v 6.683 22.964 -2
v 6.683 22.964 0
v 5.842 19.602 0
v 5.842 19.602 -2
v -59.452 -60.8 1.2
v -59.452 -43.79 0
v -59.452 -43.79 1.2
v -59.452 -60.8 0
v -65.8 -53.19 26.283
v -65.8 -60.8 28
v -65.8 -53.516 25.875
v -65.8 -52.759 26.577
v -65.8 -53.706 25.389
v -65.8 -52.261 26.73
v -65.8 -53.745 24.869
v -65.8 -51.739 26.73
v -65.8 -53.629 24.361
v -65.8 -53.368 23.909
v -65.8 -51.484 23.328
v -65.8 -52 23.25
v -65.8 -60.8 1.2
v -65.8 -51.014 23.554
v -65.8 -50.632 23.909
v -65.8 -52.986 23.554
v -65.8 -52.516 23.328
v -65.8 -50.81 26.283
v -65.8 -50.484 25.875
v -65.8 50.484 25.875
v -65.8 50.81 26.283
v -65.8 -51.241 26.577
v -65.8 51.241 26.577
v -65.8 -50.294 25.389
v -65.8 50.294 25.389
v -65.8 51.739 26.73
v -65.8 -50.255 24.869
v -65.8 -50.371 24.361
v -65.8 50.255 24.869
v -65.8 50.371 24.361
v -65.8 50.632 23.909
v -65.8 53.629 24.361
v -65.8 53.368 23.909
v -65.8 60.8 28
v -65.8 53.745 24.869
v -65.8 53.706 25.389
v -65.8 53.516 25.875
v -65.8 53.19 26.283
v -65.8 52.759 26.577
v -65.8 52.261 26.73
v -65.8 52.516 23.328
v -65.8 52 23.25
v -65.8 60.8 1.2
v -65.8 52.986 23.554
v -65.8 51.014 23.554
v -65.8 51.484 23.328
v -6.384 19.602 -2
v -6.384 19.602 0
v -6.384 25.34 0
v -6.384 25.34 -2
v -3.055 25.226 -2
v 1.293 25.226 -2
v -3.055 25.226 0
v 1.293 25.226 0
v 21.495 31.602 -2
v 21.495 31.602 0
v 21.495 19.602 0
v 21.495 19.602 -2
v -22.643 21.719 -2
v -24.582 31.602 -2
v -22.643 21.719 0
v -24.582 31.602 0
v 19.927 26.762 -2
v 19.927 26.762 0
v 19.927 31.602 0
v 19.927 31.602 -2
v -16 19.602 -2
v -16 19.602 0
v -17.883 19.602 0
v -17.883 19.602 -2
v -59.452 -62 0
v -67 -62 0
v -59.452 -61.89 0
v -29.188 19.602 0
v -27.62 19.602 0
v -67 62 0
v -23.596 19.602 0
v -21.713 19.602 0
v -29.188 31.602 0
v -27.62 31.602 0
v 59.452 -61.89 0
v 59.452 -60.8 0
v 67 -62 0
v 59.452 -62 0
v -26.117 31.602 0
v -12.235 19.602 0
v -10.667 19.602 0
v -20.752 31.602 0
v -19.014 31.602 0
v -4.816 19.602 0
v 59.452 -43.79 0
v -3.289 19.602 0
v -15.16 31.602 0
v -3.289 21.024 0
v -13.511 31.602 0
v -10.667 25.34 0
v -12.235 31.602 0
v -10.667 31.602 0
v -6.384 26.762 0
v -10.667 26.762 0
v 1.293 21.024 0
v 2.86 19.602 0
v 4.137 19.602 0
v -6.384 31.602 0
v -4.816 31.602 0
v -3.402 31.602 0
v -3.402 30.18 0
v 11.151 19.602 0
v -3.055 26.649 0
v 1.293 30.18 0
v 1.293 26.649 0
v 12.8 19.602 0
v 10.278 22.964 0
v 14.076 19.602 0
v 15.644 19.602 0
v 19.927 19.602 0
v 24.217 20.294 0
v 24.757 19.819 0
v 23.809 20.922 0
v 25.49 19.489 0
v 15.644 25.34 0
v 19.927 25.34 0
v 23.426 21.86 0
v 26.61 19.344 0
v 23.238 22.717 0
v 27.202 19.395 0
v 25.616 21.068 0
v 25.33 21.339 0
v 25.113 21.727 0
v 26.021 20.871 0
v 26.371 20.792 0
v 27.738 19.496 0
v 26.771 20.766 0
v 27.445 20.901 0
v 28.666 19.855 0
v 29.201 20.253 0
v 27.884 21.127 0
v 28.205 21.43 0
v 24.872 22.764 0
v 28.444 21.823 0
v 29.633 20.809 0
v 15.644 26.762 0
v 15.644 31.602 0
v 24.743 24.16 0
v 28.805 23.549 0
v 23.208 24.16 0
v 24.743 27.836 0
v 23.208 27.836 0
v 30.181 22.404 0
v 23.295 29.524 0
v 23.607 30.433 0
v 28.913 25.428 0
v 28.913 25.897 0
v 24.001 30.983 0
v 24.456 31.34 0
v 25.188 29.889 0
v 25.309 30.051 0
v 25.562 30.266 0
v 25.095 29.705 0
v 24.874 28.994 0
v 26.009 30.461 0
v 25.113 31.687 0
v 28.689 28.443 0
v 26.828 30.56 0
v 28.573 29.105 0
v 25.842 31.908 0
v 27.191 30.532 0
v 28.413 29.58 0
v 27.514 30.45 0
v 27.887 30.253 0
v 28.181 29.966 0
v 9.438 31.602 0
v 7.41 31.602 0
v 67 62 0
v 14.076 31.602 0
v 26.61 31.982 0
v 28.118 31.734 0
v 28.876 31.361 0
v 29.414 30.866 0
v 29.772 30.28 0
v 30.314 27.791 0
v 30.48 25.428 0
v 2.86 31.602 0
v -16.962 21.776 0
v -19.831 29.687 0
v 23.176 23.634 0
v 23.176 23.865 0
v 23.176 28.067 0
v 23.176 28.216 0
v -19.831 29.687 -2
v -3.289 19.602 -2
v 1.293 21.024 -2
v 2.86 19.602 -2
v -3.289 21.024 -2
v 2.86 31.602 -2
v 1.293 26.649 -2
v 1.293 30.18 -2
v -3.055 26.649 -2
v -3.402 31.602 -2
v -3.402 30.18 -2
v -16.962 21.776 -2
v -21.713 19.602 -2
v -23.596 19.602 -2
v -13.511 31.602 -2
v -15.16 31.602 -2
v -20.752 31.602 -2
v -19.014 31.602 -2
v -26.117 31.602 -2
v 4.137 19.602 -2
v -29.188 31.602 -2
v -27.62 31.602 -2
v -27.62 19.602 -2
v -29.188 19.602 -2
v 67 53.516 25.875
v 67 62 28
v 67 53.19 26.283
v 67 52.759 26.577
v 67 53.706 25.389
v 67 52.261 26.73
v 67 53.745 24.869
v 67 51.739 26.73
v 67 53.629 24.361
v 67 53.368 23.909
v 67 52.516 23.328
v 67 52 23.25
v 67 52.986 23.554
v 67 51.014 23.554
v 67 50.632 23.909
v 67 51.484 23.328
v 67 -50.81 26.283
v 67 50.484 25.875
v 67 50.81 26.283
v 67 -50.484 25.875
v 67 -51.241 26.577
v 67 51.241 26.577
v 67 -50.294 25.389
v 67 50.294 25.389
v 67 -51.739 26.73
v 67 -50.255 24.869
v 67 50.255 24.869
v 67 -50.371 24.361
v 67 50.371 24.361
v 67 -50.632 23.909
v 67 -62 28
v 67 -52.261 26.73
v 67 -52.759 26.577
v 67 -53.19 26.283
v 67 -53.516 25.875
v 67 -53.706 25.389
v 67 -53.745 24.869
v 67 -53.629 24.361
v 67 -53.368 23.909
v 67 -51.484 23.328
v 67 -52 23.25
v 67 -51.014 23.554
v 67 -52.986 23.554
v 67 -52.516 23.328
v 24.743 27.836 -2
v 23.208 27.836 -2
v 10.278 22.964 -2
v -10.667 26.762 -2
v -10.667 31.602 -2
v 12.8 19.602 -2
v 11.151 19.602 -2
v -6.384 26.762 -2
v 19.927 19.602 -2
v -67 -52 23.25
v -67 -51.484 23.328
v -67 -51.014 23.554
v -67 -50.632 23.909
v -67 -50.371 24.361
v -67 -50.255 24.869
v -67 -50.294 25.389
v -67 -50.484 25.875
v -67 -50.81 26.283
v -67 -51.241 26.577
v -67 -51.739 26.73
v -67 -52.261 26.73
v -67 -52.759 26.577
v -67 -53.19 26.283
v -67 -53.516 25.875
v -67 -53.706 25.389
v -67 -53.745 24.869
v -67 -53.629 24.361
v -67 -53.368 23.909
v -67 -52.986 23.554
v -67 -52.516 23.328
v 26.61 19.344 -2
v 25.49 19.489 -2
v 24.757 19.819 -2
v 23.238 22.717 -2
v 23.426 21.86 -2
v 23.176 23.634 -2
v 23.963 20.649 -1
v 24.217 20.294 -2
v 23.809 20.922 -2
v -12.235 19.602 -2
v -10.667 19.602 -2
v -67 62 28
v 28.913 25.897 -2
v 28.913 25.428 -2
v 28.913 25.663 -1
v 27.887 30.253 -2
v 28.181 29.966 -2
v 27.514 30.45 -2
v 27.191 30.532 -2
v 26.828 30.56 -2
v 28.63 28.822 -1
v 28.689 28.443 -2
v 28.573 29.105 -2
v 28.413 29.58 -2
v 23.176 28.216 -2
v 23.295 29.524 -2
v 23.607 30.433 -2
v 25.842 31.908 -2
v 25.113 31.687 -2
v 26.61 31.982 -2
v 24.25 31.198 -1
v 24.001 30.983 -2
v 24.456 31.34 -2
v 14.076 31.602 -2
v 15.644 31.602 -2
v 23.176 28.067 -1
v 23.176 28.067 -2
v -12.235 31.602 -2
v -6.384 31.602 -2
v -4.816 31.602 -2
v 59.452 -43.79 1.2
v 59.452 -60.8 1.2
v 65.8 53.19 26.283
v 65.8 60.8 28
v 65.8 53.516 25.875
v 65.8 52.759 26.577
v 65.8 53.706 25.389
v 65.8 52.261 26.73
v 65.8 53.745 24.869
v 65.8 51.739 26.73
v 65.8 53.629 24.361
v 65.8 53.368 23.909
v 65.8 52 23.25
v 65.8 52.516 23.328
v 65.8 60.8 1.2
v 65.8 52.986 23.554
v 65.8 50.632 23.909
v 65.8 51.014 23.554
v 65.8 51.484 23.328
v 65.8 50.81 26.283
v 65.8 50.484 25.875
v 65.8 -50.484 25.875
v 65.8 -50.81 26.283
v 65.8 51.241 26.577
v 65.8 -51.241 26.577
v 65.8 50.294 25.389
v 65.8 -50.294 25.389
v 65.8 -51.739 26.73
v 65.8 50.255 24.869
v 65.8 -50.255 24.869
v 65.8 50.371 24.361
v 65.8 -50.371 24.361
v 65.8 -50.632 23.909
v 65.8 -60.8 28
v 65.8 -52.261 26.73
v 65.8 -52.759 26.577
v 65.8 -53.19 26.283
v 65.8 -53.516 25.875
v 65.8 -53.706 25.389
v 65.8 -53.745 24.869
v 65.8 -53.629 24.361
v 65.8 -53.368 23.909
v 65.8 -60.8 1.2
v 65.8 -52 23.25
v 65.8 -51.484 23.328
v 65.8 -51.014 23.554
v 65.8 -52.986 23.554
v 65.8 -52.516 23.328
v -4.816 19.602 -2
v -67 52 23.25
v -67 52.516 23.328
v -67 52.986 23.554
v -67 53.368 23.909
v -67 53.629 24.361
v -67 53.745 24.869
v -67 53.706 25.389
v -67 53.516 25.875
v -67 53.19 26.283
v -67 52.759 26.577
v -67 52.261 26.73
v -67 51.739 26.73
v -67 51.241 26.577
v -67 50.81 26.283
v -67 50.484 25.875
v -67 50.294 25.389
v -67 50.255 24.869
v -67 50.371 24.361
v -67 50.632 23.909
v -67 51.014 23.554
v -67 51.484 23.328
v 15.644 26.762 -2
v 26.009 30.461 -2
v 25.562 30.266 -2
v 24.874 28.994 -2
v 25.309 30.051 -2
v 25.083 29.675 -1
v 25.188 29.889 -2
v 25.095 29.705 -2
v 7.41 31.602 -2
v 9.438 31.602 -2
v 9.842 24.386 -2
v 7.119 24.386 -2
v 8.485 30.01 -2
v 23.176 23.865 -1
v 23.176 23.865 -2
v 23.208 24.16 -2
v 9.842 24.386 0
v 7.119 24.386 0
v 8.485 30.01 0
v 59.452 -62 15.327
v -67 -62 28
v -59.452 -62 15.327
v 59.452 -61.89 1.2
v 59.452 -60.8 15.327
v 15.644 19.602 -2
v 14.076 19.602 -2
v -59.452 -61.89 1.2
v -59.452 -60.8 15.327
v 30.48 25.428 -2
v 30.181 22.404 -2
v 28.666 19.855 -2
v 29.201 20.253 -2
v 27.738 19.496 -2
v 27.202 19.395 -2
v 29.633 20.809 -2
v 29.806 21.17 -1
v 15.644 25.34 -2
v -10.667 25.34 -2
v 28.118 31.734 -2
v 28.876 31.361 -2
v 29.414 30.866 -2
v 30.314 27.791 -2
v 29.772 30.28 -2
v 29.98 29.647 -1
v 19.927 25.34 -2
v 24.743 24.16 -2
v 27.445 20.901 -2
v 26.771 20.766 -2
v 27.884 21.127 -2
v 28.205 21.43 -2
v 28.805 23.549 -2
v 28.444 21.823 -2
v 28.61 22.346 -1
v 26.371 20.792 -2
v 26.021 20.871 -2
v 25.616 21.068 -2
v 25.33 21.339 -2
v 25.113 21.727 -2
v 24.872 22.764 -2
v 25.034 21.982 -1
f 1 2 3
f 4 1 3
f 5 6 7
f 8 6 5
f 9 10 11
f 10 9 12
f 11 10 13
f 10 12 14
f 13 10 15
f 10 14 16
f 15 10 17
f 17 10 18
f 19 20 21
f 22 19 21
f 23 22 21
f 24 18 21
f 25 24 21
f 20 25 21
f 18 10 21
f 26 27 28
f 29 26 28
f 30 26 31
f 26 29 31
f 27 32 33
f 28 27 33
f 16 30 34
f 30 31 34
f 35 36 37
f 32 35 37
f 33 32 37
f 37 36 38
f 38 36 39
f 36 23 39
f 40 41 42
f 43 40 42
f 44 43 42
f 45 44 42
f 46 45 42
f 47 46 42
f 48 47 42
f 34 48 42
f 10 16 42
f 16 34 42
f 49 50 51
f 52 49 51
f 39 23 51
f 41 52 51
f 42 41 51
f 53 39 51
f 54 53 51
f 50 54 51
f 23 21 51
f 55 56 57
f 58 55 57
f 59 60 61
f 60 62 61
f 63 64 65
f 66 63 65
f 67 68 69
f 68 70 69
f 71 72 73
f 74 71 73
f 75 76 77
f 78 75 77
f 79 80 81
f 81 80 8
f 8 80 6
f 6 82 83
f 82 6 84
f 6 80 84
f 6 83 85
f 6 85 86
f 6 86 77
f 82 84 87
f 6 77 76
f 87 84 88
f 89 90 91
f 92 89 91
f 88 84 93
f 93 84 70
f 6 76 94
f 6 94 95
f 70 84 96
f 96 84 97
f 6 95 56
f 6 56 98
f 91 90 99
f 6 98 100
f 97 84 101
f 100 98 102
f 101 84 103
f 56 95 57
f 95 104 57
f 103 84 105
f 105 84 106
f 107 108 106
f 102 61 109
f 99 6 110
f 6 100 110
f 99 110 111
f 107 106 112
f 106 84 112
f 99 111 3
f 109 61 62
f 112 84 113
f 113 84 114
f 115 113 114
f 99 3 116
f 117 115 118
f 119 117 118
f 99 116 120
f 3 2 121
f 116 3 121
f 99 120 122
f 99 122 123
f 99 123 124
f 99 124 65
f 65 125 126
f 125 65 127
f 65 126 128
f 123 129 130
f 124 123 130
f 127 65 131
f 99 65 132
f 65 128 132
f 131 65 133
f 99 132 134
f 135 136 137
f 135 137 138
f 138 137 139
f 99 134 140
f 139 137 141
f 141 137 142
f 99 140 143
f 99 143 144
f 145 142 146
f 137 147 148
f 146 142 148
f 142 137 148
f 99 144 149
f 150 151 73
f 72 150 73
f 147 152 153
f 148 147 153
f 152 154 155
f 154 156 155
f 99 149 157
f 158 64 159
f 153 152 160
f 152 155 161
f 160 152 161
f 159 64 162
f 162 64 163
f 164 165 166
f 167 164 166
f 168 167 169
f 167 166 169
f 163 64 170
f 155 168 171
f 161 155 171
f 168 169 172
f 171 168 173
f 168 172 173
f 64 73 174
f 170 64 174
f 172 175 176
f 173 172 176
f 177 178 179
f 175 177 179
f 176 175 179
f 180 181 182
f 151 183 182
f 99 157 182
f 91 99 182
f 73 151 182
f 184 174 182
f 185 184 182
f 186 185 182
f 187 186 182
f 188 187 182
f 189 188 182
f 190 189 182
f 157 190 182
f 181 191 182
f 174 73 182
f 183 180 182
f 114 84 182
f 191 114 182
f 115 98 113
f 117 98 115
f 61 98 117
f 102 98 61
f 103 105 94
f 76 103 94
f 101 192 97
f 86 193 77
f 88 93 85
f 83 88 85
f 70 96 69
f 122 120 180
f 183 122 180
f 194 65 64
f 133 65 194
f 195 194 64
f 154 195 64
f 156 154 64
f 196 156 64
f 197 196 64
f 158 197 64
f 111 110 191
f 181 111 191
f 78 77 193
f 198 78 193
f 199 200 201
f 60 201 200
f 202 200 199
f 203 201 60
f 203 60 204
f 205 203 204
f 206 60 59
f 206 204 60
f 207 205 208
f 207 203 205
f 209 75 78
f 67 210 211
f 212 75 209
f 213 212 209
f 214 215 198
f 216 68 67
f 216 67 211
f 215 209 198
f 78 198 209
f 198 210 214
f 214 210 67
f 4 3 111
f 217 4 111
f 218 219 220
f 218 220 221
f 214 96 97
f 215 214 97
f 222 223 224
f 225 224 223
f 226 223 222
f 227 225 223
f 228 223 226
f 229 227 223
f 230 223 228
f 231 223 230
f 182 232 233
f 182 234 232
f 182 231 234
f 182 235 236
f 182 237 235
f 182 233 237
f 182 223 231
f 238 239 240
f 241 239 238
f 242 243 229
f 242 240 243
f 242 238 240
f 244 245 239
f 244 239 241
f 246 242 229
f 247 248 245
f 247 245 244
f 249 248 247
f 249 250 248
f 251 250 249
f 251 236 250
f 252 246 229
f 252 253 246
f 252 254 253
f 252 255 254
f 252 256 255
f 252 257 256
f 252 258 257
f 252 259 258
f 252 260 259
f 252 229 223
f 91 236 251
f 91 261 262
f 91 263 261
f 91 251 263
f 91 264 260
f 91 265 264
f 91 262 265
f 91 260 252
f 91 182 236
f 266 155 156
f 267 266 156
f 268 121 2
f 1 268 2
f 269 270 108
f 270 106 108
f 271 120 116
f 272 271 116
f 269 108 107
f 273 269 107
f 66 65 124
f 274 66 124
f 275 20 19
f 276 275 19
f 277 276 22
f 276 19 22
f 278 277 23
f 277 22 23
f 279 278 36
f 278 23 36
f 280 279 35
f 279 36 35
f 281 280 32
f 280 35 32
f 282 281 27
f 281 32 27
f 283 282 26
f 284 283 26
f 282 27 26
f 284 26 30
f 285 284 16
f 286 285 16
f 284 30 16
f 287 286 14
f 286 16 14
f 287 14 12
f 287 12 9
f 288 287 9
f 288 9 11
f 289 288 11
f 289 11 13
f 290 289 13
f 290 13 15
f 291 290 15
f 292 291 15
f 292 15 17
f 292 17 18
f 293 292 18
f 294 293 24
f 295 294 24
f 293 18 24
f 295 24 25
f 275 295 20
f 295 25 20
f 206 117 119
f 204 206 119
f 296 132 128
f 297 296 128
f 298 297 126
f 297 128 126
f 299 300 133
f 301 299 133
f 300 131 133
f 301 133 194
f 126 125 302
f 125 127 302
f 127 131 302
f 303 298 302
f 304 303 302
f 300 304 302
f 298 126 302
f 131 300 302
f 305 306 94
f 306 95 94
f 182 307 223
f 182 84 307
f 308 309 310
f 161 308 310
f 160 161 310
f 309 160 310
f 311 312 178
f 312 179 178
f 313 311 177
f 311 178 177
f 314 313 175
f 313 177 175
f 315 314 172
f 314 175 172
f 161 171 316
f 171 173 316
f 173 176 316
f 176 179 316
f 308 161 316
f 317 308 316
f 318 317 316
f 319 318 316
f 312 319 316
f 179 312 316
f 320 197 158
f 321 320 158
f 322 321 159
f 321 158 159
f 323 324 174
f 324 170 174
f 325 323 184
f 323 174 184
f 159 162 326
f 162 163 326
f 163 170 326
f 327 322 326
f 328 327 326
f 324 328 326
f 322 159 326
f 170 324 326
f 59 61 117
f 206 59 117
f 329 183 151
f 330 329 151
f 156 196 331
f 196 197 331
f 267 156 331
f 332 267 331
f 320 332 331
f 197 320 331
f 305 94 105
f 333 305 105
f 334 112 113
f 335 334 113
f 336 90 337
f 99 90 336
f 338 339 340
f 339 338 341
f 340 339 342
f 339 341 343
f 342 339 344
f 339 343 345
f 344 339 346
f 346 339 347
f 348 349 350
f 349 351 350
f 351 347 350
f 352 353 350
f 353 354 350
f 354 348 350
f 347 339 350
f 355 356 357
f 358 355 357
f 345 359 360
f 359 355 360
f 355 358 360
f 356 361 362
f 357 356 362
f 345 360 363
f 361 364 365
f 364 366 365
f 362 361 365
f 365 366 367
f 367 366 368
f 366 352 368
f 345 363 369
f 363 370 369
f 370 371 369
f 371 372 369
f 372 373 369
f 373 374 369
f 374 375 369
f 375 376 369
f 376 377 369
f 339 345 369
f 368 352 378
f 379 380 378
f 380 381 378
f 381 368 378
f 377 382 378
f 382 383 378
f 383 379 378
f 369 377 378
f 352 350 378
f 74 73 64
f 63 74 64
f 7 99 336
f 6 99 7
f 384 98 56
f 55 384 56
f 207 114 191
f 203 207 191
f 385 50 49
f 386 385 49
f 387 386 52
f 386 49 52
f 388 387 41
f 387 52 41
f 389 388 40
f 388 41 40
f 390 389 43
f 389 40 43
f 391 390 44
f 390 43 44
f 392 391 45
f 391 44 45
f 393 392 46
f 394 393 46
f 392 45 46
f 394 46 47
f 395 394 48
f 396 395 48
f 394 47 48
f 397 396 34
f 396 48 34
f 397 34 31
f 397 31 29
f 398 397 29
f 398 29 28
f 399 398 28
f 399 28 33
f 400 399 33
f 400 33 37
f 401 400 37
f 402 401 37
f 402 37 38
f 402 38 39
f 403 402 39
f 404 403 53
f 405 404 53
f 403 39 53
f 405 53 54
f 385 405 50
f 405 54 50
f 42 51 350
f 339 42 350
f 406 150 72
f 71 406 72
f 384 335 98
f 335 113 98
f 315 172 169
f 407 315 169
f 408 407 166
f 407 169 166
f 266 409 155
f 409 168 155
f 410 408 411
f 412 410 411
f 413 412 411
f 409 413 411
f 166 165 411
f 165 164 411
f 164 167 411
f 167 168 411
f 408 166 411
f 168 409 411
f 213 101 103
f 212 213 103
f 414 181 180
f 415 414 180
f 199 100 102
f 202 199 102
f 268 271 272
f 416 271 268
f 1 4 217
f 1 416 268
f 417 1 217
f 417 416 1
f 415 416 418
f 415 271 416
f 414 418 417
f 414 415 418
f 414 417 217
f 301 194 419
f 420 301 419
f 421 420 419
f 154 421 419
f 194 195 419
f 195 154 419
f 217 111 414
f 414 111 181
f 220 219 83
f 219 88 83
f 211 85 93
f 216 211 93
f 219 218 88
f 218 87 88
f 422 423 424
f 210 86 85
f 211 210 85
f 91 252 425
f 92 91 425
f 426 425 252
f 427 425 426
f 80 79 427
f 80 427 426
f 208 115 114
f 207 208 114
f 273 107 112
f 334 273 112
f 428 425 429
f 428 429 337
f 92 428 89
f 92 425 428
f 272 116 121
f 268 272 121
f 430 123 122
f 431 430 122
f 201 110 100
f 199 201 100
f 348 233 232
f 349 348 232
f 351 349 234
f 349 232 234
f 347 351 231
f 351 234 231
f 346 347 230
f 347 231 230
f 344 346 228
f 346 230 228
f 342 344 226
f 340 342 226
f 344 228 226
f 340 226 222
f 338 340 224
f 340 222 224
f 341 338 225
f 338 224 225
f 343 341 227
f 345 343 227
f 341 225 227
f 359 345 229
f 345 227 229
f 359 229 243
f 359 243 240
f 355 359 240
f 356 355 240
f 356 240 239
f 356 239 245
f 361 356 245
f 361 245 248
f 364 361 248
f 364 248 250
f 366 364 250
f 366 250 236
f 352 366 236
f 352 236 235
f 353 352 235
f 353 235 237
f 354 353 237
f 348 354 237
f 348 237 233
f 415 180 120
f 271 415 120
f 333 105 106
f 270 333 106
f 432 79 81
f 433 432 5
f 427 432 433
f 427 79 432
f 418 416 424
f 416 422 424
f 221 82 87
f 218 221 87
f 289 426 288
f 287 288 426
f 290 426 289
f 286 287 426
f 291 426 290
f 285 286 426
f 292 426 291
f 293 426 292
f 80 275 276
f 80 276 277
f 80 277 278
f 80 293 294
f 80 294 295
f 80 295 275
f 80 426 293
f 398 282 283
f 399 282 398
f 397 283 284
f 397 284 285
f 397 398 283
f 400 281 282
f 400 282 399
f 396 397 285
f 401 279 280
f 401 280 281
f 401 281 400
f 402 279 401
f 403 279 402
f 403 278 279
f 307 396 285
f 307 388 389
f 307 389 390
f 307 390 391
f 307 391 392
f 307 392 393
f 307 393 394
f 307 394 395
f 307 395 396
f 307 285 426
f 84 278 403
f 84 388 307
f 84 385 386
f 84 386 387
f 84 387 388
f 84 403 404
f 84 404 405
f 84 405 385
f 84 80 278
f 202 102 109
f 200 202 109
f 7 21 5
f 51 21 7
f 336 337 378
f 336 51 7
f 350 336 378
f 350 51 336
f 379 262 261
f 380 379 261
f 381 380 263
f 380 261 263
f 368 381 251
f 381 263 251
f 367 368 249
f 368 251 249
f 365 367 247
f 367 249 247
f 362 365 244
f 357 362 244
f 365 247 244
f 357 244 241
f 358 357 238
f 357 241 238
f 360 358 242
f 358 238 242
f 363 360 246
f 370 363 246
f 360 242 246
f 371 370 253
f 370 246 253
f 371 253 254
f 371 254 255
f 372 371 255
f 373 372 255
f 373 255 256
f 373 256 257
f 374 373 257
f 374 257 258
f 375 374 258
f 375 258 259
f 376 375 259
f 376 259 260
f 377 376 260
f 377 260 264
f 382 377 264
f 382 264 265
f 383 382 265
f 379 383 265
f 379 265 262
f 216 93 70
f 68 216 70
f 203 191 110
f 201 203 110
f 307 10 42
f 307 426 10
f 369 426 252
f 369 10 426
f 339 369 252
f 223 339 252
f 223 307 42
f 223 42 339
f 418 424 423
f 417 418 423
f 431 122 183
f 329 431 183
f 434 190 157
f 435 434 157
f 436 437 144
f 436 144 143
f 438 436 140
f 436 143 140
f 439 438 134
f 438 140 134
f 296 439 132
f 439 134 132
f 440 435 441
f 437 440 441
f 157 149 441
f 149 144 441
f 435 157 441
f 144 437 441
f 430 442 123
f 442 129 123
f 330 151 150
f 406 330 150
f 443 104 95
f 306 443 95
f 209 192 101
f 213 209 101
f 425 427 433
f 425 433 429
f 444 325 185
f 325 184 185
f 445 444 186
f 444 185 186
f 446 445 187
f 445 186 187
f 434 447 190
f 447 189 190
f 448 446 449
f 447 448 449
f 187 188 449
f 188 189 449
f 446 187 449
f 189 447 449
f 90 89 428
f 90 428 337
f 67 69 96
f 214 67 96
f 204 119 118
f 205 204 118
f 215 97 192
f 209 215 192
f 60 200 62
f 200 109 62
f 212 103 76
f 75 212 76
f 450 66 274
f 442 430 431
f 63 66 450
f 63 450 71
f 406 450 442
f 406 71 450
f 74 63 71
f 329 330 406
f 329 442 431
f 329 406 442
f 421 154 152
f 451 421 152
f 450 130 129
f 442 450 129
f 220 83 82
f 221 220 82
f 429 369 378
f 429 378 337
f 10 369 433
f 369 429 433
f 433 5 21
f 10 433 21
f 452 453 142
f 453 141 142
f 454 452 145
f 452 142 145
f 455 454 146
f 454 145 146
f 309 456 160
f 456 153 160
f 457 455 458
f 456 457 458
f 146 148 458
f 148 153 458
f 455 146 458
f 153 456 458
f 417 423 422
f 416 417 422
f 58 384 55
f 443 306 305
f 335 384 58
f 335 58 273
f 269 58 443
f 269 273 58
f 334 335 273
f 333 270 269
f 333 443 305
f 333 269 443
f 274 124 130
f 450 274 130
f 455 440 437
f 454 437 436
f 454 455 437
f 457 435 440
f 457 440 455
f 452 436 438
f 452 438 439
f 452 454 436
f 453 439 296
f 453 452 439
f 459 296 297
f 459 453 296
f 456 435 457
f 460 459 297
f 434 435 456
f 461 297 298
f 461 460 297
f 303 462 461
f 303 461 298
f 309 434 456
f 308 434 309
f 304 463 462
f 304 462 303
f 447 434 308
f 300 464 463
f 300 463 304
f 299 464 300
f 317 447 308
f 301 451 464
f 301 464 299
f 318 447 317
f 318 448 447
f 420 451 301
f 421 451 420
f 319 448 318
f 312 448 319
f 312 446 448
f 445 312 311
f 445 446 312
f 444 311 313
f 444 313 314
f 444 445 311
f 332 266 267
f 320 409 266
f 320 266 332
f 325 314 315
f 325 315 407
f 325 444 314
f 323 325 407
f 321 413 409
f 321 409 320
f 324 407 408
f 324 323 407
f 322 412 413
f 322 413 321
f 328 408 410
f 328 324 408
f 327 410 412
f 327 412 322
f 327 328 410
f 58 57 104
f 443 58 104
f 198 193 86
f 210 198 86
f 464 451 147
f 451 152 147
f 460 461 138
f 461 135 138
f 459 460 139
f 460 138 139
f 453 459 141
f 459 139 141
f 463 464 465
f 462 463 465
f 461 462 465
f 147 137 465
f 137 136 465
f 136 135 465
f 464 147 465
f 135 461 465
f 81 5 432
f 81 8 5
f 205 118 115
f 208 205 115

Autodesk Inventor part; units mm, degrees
ref_plane "YZ Plane" through (0, 0, 0) normal (1, 0, 0) x (0, 1, 0)
ref_plane "XZ Plane" through (0, 0, 0) normal (0, 1, 0) x (-1, 0, 0)
ref_plane "XY Plane" through (0, 0, 0) normal (0, 0, 1) x (1, 0, 0)
sketch "스케치1" plane through (0, 0, 0) normal (0, 0, 1) x (1, 0, 0)
  line L0 (67, -62) -> (-67, -62)
  line L1 (-67, -62) -> (-67, 62)
  line L2 (-67, 62) -> (67, 62)
  line L3 (67, 62) -> (67, -62)
  line L4 (67, -62) -> (-67, 62) construction
  line L5 (-67, -62) -> (67, 62) construction
  point P0 (0, 0)
  dimension "d0" = 134
  dimension "d1" = 124
extrude "돌출1" add sketch "스케치1" along normal blind 28
shell "쉘1" thickness 1.2 removed faces 1 at (22.3333, 20.6667, 28)
sketch "스케치2" plane through (0, 0, 0) normal (0, 0, -1) x (-1, 0, 0)
  line L0 (59.4523, -61.8902) -> (-59.4523, -61.8902)
  line L1 (-59.4523, -61.8902) -> (-59.4523, -43.79)
  line L2 (-59.4523, -43.79) -> (59.4523, -43.79)
  line L3 (59.4523, -43.79) -> (59.4523, -61.8902)
  line L4 (59.4523, -61.8902) -> (-59.4523, -43.79) construction
  line L5 (-59.4523, -61.8902) -> (59.4523, -43.79) construction
  point P0 (0, 0)
  point P1 (0, -52.8401)
extrude "돌출2" cut sketch "스케치2" against normal blind 1.2
sketch "스케치3" plane through (0, 0, 0) normal (0, 0, -1) x (-1, 0, 0)
  line L0 (-31.3452, 31.9819) -> (-10.2317, 31.9819) construction
  line L1 (-10.2317, 31.9819) -> (-10.2317, 28.3571) construction
  line L2 (-10.2317, 28.3571) -> (-31.3452, 28.3571) construction
  line L3 (-31.3452, 28.3571) -> (-31.3452, 31.9819) construction
  spline S0 degree 2 poles (-23.1755, 23.6344) (-23.1755, 23.7476) (-23.1755, 23.9819) (-23.2078, 24.1597) knots 0 0 0 1 2 2 2
  line L4 (-23.2078, 24.1597) -> (-24.7432, 24.1597)
  spline S1 degree 2 poles (-24.7432, 24.1597) (-24.7432, 23.1981) (-25.325, 20.7657) (-26.7714, 20.7657) knots 0 0 0 1 2 2 2
  spline S2 degree 2 poles (-26.7714, 20.7657) (-28.3068, 20.8789) (-28.9129, 23.8122) (-28.9129, 25.4284) knots 0 0 0 1 2 2 2
  spline S3 degree 2 poles (-28.9129, 25.4284) (-28.9129, 25.5496) (-28.9129, 25.7758) (-28.9129, 25.8971) knots 0 0 0 1 2 2 2
  spline S4 degree 2 poles (-28.9129, 25.8971) (-28.9129, 27.0849) (-28.3472, 30.5597) (-26.828, 30.5597) knots 0 0 0 1 2 2 2
  spline S5 degree 2 poles (-26.828, 30.5597) (-25.4219, 30.5597) (-24.7432, 28.79) (-24.7432, 27.8364) knots 0 0 0 1 2 2 2
  line L5 (-24.7432, 27.8364) -> (-23.2078, 27.8364)
  spline S6 degree 2 poles (-23.2078, 27.8364) (-23.1755, 27.9819) (-23.1755, 28.1516) (-23.1755, 28.2162) knots 0 0 0 1 2 2 2
  spline S7 degree 2 poles (-23.1755, 28.2162) (-23.1755, 30.4142) (-25.325, 31.9819) (-26.6098, 31.9819) knots 0 0 0 1 2 2 2
  spline S8 degree 2 poles (-26.6098, 31.9819) (-29.4785, 31.893) (-30.4805, 27.4001) (-30.4805, 25.4284) knots 0 0 0 1 2 2 2
  spline S9 degree 2 poles (-30.4805, 25.4284) (-30.4805, 22.8829) (-29.131, 19.4567) (-26.6098, 19.3435) knots 0 0 0 1 2 2 2
  spline S10 degree 2 poles (-26.6098, 19.3435) (-24.7512, 19.3435) (-23.1755, 21.9536) (-23.1755, 23.6344) knots 0 0 0 1 2 2 2
  line L6 (-14.0765, 19.6021) -> (-14.0765, 31.6021)
  line L7 (-14.0765, 31.6021) -> (-15.6442, 31.6021)
  line L8 (-15.6442, 31.6021) -> (-15.6442, 26.7617)
  line L9 (-15.6442, 26.7617) -> (-19.927, 26.7617)
  line L10 (-19.927, 26.7617) -> (-19.927, 31.6021)
  line L11 (-19.927, 31.6021) -> (-21.4947, 31.6021)
  line L12 (-21.4947, 31.6021) -> (-21.4947, 19.6021)
  line L13 (-21.4947, 19.6021) -> (-19.927, 19.6021)
  line L14 (-19.927, 19.6021) -> (-19.927, 25.3395)
  line L15 (-19.927, 25.3395) -> (-15.6442, 25.3395)
  line L16 (-15.6442, 25.3395) -> (-15.6442, 19.6021)
  line L17 (-15.6442, 19.6021) -> (-14.0765, 19.6021)
  line L18 (-4.1371, 19.6021) -> (-7.4098, 31.6021)
  line L19 (-7.4098, 31.6021) -> (-9.4381, 31.6021)
  line L20 (-9.4381, 31.6021) -> (-12.7997, 19.6021)
  line L21 (-12.7997, 19.6021) -> (-11.1512, 19.6021)
  line L22 (-11.1512, 19.6021) -> (-10.2785, 22.9637)
  line L23 (-10.2785, 22.9637) -> (-6.6826, 22.9637)
  line L24 (-6.6826, 22.9637) -> (-5.8421, 19.6021)
  line L25 (-5.8421, 19.6021) -> (-4.1371, 19.6021)
  line L26 (-7.1189, 24.3859) -> (-9.8421, 24.3859)
  line L27 (-9.8421, 24.3859) -> (-8.4846, 30.0102)
  line L28 (-8.4846, 30.0102) -> (-7.1189, 24.3859)
  line L29 (3.4023, 30.1799) -> (3.4023, 31.6021)
  line L30 (3.4023, 31.6021) -> (-2.8603, 31.6021)
  line L31 (-2.8603, 31.6021) -> (-2.8603, 19.6021)
  line L32 (-2.8603, 19.6021) -> (3.2892, 19.6021)
  line L33 (3.2892, 19.6021) -> (3.2892, 21.0243)
  line L34 (3.2892, 21.0243) -> (-1.2927, 21.0243)
  line L35 (-1.2927, 21.0243) -> (-1.2927, 25.2263)
  line L36 (-1.2927, 25.2263) -> (3.0548, 25.2263)
  line L37 (3.0548, 25.2263) -> (3.0548, 26.6486)
  line L38 (3.0548, 26.6486) -> (-1.2927, 26.6486)
  line L39 (-1.2927, 26.6486) -> (-1.2927, 30.1799)
  line L40 (-1.2927, 30.1799) -> (3.4023, 30.1799)
  line L41 (12.2346, 19.6021) -> (12.2346, 31.6021)
  line L42 (12.2346, 31.6021) -> (10.6669, 31.6021)
  line L43 (10.6669, 31.6021) -> (10.6669, 26.7617)
  line L44 (10.6669, 26.7617) -> (6.3841, 26.7617)
  line L45 (6.3841, 26.7617) -> (6.3841, 31.6021)
  line L46 (6.3841, 31.6021) -> (4.8164, 31.6021)
  line L47 (4.8164, 31.6021) -> (4.8164, 19.6021)
  line L48 (4.8164, 19.6021) -> (6.3841, 19.6021)
  line L49 (6.3841, 19.6021) -> (6.3841, 25.3395)
  line L50 (6.3841, 25.3395) -> (10.6669, 25.3395)
  line L51 (10.6669, 25.3395) -> (10.6669, 19.6021)
  line L52 (10.6669, 19.6021) -> (12.2346, 19.6021)
  line L53 (26.1174, 31.6021) -> (24.5821, 31.6021)
  line L54 (24.5821, 31.6021) -> (22.6427, 21.7193)
  line L55 (22.6427, 21.7193) -> (20.7518, 31.6021)
  line L56 (20.7518, 31.6021) -> (19.0144, 31.6021)
  line L57 (19.0144, 31.6021) -> (16.9619, 21.7758)
  line L58 (16.9619, 21.7758) -> (15.1599, 31.6021)
  line L59 (15.1599, 31.6021) -> (13.5114, 31.6021)
  line L60 (13.5114, 31.6021) -> (16.0003, 19.6021)
  line L61 (16.0003, 19.6021) -> (17.8831, 19.6021)
  line L62 (17.8831, 19.6021) -> (19.8306, 29.687)
  line L63 (19.8306, 29.687) -> (21.7134, 19.6021)
  line L64 (21.7134, 19.6021) -> (23.5962, 19.6021)
  line L65 (23.5962, 19.6021) -> (26.1174, 31.6021)
  line L66 (29.1882, 19.6021) -> (29.1882, 31.6021)
  line L67 (29.1882, 31.6021) -> (27.6205, 31.6021)
  line L68 (27.6205, 31.6021) -> (27.6205, 19.6021)
  line L69 (27.6205, 19.6021) -> (29.1882, 19.6021)
  point P0 (0, 0)
  dimension "d0" = 134
  dimension "d1" = 124
extrude "돌출3" add sketch "스케치3" along normal blind 2
sketch "스케치5" plane through (-67, -62, 0) normal (0, -1, 0) x (1, 0, 0)
  line L0 (7.5477, 0) -> (126.4523, 0) projected
  line L1 (126.4523, 0) -> (7.5477, 0)
  line L2 (7.5477, 0) -> (7.5477, 15.3269)
  line L3 (7.5477, 15.3269) -> (126.4523, 15.3269)
  line L4 (126.4523, 15.3269) -> (126.4523, 0)
  point P0 (67, 0)
extrude "돌출5" cut sketch "스케치5" against normal blind 1.2
sketch "스케치6" plane through (67, -62, 0) normal (1, 0, 0) x (0, 0, -1)
  line L0 (-28, 0) -> (-28, 124) construction
  line L1 (-28, 124) -> (-25, 124) construction
  line L2 (0, 124) -> (-28, 124) construction
  line L3 (-25, 124) -> (-25, 114) construction
  circle A0 centre (-25, 114) radius 1.75
  line L4 (-28, 0) -> (-25, 0) construction
  line L5 (0, 0) -> (-28, 0) construction
  line L6 (-25, 0) -> (-25, 10) construction
  circle A1 centre (-25, 10) radius 1.75
  point P0 (0, 62)
  dimension "d13" = 3
  dimension "d14" = 10
  dimension "d15" = 3.5
  dimension "d16" = 3
  dimension "d17" = 10
  dimension "d18" = 3.5
extrude "돌출6" cut sketch "스케치6" against normal blind 200
properties part number "240621_뚜껑"
